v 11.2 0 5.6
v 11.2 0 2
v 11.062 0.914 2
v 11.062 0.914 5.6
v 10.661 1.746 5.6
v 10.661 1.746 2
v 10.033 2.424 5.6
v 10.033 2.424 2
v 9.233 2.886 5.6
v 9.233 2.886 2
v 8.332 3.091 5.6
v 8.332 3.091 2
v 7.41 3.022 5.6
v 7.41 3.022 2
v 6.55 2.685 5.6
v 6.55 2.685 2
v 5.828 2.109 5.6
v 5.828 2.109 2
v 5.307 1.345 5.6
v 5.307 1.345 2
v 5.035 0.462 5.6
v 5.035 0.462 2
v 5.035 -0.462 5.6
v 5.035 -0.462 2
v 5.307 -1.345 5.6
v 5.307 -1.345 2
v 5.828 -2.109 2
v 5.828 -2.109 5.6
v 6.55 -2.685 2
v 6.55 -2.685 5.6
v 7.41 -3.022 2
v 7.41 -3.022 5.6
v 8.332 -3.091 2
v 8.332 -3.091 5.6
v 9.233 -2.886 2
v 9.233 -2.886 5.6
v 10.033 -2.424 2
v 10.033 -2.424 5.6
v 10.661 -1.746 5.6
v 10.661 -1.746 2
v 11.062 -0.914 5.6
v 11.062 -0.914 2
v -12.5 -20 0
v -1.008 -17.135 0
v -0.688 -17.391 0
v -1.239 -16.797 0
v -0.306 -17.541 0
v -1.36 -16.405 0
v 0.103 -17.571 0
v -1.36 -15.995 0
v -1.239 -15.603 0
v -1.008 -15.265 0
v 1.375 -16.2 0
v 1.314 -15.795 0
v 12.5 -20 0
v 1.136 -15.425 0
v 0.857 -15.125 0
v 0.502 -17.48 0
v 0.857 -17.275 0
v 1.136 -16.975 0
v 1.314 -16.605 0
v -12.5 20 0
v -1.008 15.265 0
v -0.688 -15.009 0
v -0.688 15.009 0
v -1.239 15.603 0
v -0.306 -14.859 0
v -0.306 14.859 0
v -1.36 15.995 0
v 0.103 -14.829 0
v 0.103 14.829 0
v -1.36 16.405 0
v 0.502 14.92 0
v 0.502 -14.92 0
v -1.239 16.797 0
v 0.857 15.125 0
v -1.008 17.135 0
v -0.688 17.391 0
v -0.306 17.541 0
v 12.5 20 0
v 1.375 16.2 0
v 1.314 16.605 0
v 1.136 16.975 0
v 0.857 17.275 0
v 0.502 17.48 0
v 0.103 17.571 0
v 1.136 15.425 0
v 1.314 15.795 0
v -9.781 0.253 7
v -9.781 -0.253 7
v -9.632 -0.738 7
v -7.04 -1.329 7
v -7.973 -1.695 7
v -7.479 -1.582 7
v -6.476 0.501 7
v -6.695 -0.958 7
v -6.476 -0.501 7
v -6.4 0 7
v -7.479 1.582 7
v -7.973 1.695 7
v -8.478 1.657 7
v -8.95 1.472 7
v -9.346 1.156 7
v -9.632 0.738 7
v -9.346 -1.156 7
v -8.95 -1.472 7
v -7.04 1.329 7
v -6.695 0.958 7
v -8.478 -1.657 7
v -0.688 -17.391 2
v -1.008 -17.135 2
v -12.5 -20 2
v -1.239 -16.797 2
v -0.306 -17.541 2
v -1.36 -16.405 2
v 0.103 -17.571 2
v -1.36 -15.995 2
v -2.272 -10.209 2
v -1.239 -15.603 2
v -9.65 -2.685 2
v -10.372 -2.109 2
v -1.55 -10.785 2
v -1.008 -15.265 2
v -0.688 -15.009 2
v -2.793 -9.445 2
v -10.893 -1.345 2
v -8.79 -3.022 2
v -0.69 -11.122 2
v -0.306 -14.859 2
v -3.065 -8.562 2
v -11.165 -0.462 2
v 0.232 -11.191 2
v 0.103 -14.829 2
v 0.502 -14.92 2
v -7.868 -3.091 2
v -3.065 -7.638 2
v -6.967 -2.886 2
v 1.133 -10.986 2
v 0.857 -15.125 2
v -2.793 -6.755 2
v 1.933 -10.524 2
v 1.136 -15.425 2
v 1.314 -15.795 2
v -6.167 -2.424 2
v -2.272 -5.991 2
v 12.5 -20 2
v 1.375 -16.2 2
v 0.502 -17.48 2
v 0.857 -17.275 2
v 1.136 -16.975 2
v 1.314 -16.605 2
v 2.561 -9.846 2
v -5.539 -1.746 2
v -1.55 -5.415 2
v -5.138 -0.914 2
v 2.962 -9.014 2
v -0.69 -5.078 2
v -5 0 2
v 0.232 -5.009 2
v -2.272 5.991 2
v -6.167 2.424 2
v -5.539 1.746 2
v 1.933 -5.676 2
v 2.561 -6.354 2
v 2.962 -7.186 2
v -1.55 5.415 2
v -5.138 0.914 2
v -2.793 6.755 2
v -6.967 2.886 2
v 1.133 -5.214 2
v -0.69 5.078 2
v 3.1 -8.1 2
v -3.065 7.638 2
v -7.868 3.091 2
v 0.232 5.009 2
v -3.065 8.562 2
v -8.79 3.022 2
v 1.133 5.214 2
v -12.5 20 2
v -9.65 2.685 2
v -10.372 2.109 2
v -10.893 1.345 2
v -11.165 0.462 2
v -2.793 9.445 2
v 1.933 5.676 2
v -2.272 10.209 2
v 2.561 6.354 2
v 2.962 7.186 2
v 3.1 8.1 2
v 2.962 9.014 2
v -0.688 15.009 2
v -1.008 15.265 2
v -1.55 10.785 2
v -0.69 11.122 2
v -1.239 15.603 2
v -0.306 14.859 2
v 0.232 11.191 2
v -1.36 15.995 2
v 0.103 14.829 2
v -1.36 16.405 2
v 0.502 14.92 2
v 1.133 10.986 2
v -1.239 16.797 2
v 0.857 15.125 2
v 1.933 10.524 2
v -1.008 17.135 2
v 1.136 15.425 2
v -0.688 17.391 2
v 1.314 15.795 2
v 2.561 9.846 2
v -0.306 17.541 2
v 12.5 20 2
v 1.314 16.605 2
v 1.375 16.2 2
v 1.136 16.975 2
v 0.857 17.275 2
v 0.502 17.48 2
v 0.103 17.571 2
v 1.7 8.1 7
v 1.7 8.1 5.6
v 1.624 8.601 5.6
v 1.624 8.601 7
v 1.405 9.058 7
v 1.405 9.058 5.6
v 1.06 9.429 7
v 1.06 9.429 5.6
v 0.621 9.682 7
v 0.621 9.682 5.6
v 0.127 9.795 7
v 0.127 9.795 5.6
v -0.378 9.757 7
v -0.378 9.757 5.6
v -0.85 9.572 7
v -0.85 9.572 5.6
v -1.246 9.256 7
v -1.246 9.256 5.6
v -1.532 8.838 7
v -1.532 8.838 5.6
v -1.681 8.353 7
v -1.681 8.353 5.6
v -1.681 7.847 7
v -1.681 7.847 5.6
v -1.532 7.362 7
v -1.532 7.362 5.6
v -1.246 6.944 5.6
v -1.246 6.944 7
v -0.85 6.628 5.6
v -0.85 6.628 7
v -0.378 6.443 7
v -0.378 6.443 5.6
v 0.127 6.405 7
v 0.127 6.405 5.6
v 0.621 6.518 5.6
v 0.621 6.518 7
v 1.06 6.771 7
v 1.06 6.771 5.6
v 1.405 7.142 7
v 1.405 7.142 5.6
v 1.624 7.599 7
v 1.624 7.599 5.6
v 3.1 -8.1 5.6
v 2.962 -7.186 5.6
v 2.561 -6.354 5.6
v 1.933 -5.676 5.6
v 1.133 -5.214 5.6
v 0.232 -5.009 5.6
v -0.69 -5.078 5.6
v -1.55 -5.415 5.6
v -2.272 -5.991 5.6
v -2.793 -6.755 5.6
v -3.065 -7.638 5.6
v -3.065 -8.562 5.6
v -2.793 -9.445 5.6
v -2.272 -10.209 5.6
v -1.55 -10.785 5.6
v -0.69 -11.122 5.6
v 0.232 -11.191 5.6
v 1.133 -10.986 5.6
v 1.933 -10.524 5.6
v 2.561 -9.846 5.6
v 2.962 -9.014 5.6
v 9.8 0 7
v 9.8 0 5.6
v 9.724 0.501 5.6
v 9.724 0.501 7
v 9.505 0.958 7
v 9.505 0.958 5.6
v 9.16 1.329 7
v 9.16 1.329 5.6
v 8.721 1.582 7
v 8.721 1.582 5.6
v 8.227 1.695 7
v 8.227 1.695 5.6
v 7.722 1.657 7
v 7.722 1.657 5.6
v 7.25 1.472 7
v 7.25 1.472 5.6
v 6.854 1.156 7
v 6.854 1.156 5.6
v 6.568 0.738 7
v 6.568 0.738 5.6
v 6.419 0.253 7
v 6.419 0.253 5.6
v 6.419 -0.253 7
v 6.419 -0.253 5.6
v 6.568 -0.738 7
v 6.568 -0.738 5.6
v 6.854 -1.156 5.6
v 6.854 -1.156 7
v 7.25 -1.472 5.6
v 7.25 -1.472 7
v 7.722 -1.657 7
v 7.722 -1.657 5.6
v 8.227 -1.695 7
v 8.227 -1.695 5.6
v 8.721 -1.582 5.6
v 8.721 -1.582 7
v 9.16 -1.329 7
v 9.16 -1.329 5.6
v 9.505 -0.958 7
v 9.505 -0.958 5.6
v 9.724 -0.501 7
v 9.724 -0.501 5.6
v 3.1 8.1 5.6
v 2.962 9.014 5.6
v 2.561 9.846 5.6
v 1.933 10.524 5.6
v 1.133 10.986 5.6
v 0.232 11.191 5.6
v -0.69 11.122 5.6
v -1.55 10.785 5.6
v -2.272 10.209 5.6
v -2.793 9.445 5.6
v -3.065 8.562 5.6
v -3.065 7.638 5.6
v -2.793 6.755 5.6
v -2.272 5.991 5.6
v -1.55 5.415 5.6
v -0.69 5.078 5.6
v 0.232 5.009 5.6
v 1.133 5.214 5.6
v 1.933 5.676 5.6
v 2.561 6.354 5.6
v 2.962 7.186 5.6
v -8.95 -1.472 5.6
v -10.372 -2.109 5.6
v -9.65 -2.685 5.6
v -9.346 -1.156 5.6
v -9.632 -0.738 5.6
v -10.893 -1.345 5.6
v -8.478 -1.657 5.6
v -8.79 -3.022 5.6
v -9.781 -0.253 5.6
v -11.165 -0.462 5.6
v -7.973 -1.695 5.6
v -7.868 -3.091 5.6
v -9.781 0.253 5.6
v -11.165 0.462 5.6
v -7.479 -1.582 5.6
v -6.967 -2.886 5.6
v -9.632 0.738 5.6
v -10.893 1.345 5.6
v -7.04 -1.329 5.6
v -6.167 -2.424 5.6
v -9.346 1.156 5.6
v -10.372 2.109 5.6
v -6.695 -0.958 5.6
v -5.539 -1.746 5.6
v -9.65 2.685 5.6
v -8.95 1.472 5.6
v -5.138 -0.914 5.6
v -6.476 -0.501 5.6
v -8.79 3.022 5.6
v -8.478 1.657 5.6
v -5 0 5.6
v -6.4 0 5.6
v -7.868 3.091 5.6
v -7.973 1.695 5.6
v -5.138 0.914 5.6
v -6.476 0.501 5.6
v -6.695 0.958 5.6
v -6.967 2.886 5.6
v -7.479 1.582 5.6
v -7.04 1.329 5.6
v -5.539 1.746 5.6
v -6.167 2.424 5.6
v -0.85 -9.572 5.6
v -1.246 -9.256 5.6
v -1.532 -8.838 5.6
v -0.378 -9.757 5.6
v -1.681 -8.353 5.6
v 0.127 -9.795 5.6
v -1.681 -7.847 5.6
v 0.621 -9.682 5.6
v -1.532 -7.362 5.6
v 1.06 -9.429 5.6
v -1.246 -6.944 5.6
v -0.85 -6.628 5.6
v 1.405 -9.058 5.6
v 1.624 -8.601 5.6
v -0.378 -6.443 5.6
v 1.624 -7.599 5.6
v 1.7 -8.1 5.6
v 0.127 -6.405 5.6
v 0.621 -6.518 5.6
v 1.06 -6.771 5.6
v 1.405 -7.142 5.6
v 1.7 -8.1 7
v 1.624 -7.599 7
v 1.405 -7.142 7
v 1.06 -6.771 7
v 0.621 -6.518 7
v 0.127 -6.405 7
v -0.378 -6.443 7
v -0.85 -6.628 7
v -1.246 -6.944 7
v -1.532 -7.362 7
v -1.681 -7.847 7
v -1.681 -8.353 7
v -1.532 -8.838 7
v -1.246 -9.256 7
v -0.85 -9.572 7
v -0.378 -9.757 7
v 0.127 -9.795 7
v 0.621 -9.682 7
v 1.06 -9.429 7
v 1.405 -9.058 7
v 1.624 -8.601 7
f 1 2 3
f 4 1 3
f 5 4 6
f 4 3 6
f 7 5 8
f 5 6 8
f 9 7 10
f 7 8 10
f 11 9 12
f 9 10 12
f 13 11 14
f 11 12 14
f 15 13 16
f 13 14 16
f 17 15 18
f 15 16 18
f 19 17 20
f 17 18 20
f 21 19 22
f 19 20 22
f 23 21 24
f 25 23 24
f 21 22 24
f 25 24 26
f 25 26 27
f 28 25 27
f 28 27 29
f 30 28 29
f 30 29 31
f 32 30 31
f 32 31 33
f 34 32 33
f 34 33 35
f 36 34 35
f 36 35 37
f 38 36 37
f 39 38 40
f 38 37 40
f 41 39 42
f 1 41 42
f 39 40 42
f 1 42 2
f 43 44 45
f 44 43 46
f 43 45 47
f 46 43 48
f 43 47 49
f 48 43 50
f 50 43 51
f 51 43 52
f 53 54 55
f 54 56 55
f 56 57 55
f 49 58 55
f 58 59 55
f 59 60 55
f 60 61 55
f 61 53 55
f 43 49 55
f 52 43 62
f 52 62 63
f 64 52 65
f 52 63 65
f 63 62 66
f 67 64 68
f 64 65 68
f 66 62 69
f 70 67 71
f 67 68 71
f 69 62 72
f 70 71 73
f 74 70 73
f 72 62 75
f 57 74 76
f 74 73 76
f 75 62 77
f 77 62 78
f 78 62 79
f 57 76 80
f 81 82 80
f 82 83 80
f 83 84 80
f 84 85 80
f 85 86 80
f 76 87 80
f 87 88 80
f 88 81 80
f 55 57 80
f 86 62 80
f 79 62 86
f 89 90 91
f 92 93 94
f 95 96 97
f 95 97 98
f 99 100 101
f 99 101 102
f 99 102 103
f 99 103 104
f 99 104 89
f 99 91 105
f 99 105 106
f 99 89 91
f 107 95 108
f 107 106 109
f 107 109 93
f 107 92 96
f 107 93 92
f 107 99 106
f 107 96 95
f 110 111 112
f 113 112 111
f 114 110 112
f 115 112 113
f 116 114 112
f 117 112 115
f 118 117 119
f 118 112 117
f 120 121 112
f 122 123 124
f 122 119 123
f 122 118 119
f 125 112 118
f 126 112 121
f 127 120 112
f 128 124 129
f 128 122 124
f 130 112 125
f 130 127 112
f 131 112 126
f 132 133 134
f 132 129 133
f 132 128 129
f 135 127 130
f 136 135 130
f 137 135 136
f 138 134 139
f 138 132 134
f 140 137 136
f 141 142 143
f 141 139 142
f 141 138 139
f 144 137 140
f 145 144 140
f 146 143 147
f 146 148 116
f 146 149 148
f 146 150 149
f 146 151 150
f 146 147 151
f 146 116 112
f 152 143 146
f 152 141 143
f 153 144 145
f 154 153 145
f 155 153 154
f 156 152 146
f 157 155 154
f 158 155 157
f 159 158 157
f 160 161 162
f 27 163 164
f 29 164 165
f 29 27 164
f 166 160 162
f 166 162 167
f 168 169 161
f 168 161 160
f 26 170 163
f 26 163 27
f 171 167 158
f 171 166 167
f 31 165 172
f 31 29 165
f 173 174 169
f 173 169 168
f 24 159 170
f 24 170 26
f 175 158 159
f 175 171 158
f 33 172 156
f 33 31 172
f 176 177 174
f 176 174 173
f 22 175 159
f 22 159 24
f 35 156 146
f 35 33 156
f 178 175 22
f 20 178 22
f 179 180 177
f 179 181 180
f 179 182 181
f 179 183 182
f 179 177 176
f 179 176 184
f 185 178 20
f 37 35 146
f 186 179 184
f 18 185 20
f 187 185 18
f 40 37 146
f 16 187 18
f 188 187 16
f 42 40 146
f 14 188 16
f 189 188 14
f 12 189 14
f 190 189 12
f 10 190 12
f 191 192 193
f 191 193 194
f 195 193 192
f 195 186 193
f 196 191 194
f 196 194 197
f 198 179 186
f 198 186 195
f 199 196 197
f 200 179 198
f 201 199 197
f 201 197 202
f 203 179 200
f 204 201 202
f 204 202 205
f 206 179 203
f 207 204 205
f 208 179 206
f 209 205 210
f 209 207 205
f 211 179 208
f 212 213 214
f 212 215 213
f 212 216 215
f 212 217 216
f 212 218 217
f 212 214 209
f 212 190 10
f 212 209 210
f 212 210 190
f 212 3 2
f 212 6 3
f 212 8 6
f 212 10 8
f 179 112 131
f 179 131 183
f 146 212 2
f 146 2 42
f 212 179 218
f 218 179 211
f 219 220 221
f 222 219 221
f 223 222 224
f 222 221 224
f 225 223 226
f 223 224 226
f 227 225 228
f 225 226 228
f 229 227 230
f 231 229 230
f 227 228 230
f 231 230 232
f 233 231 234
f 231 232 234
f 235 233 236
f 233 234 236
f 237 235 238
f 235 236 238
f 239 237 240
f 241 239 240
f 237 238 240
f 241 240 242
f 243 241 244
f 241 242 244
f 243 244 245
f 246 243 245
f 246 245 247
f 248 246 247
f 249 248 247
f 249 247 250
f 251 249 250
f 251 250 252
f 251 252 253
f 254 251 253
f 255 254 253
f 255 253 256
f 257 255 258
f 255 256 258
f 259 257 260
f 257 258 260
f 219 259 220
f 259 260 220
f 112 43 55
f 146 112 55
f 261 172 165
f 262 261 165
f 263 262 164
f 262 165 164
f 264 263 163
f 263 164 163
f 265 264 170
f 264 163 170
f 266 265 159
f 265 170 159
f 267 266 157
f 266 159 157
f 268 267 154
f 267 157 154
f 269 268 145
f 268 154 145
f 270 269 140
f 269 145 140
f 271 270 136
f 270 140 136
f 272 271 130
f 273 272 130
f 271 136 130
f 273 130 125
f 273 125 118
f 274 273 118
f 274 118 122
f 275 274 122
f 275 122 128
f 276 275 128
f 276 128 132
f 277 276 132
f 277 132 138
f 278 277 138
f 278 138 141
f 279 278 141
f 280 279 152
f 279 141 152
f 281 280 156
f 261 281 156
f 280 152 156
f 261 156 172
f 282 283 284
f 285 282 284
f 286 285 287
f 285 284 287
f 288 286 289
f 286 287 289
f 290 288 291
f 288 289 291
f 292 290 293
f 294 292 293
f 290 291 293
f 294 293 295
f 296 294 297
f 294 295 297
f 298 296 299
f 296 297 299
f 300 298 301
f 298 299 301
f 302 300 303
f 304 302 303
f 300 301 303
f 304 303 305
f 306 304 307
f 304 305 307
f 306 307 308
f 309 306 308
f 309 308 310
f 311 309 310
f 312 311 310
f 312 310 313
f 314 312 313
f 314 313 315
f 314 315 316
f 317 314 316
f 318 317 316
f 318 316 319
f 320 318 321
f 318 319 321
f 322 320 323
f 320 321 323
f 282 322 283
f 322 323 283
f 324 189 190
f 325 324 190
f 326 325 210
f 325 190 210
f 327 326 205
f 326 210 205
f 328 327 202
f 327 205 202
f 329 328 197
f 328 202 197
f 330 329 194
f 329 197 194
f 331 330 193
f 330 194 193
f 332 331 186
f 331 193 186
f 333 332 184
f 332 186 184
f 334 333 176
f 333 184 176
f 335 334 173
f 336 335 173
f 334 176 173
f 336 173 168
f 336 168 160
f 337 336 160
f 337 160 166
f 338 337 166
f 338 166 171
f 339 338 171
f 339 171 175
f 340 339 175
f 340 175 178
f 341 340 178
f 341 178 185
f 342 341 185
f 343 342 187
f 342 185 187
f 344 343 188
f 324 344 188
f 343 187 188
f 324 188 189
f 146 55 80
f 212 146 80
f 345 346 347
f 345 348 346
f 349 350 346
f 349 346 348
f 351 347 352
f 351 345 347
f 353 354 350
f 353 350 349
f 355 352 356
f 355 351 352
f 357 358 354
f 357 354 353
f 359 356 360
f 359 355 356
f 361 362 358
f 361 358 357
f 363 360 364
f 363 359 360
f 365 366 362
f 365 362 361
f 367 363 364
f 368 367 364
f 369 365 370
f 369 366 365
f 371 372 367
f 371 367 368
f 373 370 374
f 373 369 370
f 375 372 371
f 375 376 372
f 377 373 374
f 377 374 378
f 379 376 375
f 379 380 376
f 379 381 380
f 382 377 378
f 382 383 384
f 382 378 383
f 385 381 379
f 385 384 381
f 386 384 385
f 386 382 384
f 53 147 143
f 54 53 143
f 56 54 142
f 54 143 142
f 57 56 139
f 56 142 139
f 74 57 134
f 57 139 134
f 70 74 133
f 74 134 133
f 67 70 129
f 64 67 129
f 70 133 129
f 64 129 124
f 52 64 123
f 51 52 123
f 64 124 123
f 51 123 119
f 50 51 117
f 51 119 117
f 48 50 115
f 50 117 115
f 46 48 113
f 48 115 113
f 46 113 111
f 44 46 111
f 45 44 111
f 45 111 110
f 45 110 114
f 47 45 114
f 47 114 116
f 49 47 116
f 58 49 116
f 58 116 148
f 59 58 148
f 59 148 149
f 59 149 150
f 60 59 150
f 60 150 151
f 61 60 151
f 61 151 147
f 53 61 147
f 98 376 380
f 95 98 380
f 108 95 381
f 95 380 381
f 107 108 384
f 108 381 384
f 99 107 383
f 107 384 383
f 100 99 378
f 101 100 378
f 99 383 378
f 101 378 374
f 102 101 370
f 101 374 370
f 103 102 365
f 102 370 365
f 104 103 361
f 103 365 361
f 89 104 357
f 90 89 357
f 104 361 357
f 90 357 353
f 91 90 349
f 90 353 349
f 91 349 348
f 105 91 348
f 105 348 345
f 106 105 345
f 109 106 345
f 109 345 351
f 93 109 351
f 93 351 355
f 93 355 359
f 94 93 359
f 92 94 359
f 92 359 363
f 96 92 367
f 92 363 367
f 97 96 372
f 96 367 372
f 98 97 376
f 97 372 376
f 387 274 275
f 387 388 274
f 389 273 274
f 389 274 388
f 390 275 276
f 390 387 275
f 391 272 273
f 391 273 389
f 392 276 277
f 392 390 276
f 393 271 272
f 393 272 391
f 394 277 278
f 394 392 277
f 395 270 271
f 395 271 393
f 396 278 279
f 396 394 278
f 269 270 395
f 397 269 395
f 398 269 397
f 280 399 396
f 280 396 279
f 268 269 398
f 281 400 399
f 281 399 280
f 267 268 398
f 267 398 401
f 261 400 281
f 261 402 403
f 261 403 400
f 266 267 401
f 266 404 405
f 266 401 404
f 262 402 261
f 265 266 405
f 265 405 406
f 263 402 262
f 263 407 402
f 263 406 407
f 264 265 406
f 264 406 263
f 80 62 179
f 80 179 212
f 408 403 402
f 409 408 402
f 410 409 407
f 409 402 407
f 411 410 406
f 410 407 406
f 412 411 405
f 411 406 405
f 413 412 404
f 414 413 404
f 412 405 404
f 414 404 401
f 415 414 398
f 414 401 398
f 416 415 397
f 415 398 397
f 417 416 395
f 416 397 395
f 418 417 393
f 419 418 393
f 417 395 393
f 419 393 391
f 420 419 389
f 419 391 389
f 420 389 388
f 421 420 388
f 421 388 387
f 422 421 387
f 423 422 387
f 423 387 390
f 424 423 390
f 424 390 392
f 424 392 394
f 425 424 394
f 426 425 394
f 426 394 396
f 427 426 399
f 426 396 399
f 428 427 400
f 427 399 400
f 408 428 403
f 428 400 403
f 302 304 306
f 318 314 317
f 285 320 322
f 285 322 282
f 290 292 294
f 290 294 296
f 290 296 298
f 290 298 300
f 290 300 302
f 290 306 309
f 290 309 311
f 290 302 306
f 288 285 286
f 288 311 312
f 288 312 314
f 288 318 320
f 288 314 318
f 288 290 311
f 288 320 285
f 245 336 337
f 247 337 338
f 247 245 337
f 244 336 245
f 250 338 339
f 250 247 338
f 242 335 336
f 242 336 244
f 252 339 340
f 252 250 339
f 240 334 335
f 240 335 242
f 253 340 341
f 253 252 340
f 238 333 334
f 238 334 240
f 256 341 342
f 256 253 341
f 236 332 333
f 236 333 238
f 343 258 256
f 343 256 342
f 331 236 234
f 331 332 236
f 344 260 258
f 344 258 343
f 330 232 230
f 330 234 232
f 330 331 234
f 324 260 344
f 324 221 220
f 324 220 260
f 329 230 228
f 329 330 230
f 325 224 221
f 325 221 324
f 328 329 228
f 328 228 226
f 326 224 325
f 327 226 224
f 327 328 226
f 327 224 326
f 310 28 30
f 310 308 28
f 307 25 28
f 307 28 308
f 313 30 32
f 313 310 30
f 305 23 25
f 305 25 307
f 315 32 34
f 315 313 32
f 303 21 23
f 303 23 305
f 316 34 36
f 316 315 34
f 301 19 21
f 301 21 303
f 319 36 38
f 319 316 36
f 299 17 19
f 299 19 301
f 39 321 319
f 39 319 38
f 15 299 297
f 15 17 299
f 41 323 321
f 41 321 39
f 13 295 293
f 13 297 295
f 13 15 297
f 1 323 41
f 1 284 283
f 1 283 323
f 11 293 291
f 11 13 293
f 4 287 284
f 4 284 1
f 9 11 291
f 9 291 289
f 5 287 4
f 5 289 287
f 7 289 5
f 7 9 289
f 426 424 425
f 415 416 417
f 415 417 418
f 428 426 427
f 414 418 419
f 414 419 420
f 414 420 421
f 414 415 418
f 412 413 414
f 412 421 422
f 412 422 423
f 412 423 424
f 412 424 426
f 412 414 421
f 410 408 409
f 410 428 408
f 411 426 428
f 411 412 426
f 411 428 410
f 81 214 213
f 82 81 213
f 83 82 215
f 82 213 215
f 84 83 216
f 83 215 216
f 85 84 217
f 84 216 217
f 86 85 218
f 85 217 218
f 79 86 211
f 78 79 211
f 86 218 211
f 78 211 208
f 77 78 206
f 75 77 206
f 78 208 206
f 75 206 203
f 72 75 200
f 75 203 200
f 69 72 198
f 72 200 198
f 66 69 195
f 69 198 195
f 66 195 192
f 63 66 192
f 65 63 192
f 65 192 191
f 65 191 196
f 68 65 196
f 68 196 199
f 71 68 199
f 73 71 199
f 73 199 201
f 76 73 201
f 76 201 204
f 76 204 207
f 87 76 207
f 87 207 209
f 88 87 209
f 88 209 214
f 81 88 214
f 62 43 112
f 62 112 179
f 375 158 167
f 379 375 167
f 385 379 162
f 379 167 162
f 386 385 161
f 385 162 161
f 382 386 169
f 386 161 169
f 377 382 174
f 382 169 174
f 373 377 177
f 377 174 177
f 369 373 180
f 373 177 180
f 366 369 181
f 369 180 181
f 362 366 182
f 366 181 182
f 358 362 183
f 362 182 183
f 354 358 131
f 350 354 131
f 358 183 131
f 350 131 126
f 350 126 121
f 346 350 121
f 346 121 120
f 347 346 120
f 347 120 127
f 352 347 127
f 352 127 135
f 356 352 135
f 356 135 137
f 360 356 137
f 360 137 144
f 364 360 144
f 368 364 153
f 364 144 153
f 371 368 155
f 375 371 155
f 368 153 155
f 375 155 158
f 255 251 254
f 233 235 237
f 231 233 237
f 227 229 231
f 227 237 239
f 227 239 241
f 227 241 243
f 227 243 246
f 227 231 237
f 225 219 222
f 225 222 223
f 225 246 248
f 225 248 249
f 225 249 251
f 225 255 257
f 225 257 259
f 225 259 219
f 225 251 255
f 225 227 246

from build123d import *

# Parameters (mm, degrees)
SKETCH1_W           = 25
SKETCH1_H           = 40
BOSS_EXTRUDE1_DEPTH = 2
SKETCH2_R           = 3.1
BOSS_EXTRUDE2_DEPTH = 3.6
SKETCH3_R           = 1.7
BOSS_EXTRUDE3_DEPTH = 1.4
SKETCH4_R           = 1.7
BOSS_EXTRUDE4_DEPTH = 1.4
SKETCH5_R           = 1.7
BOSS_EXTRUDE5_DEPTH = 1.4
SKETCH6_R           = 1.7
BOSS_EXTRUDE6_DEPTH = 1.4
SKETCH7_R           = 1.375
CUT_EXTRUDE1_DEPTH  = 3


with BuildPart() as part:
    # Sketch1 → Boss-Extrude1 (new body)
    with BuildSketch(Plane.XY):
        Rectangle(SKETCH1_W, SKETCH1_H)
    extrude(amount=BOSS_EXTRUDE1_DEPTH)

    # Sketch2 → Boss-Extrude2 (add)
    with BuildSketch(Plane.XY.offset(2)):
        with Locations((-8.1, 0)):
            Circle(SKETCH2_R)
        with Locations((8.1, 0)):
            Circle(SKETCH2_R)
        with Locations((0, 8.1)):
            Circle(SKETCH2_R)
        with Locations((0, -8.1)):
            Circle(SKETCH2_R)
    extrude(amount=BOSS_EXTRUDE2_DEPTH)

    # Sketch3 → Boss-Extrude3 (add)
    with BuildSketch(Plane.XY.offset(5.6)):
        with Locations((0, 8.1)):
            Circle(SKETCH3_R)
    extrude(amount=BOSS_EXTRUDE3_DEPTH)

    # Sketch4 → Boss-Extrude4 (add)
    with BuildSketch(Plane.XY.offset(5.6)):
        with Locations((-8.1, 0)):
            Circle(SKETCH4_R)
    extrude(amount=BOSS_EXTRUDE4_DEPTH)

    # Sketch5 → Boss-Extrude5 (add)
    with BuildSketch(Plane.XY.offset(5.6)):
        with Locations((8.1, 0)):
            Circle(SKETCH5_R)
    extrude(amount=BOSS_EXTRUDE5_DEPTH)

    # Sketch6 → Boss-Extrude6 (add)
    with BuildSketch(Plane.XY.offset(5.6)):
        with Locations((0, -8.1)):
            Circle(SKETCH6_R)
    extrude(amount=BOSS_EXTRUDE6_DEPTH)

    # Sketch7 → Cut-Extrude1 (cut)
    with BuildSketch(Plane.XY.offset(2)):
        with Locations((0, 16.2)):
            Circle(SKETCH7_R)
        with Locations((0, -16.2)):
            Circle(SKETCH7_R)
    extrude(amount=-CUT_EXTRUDE1_DEPTH, mode=Mode.SUBTRACT)


solid = part.part
